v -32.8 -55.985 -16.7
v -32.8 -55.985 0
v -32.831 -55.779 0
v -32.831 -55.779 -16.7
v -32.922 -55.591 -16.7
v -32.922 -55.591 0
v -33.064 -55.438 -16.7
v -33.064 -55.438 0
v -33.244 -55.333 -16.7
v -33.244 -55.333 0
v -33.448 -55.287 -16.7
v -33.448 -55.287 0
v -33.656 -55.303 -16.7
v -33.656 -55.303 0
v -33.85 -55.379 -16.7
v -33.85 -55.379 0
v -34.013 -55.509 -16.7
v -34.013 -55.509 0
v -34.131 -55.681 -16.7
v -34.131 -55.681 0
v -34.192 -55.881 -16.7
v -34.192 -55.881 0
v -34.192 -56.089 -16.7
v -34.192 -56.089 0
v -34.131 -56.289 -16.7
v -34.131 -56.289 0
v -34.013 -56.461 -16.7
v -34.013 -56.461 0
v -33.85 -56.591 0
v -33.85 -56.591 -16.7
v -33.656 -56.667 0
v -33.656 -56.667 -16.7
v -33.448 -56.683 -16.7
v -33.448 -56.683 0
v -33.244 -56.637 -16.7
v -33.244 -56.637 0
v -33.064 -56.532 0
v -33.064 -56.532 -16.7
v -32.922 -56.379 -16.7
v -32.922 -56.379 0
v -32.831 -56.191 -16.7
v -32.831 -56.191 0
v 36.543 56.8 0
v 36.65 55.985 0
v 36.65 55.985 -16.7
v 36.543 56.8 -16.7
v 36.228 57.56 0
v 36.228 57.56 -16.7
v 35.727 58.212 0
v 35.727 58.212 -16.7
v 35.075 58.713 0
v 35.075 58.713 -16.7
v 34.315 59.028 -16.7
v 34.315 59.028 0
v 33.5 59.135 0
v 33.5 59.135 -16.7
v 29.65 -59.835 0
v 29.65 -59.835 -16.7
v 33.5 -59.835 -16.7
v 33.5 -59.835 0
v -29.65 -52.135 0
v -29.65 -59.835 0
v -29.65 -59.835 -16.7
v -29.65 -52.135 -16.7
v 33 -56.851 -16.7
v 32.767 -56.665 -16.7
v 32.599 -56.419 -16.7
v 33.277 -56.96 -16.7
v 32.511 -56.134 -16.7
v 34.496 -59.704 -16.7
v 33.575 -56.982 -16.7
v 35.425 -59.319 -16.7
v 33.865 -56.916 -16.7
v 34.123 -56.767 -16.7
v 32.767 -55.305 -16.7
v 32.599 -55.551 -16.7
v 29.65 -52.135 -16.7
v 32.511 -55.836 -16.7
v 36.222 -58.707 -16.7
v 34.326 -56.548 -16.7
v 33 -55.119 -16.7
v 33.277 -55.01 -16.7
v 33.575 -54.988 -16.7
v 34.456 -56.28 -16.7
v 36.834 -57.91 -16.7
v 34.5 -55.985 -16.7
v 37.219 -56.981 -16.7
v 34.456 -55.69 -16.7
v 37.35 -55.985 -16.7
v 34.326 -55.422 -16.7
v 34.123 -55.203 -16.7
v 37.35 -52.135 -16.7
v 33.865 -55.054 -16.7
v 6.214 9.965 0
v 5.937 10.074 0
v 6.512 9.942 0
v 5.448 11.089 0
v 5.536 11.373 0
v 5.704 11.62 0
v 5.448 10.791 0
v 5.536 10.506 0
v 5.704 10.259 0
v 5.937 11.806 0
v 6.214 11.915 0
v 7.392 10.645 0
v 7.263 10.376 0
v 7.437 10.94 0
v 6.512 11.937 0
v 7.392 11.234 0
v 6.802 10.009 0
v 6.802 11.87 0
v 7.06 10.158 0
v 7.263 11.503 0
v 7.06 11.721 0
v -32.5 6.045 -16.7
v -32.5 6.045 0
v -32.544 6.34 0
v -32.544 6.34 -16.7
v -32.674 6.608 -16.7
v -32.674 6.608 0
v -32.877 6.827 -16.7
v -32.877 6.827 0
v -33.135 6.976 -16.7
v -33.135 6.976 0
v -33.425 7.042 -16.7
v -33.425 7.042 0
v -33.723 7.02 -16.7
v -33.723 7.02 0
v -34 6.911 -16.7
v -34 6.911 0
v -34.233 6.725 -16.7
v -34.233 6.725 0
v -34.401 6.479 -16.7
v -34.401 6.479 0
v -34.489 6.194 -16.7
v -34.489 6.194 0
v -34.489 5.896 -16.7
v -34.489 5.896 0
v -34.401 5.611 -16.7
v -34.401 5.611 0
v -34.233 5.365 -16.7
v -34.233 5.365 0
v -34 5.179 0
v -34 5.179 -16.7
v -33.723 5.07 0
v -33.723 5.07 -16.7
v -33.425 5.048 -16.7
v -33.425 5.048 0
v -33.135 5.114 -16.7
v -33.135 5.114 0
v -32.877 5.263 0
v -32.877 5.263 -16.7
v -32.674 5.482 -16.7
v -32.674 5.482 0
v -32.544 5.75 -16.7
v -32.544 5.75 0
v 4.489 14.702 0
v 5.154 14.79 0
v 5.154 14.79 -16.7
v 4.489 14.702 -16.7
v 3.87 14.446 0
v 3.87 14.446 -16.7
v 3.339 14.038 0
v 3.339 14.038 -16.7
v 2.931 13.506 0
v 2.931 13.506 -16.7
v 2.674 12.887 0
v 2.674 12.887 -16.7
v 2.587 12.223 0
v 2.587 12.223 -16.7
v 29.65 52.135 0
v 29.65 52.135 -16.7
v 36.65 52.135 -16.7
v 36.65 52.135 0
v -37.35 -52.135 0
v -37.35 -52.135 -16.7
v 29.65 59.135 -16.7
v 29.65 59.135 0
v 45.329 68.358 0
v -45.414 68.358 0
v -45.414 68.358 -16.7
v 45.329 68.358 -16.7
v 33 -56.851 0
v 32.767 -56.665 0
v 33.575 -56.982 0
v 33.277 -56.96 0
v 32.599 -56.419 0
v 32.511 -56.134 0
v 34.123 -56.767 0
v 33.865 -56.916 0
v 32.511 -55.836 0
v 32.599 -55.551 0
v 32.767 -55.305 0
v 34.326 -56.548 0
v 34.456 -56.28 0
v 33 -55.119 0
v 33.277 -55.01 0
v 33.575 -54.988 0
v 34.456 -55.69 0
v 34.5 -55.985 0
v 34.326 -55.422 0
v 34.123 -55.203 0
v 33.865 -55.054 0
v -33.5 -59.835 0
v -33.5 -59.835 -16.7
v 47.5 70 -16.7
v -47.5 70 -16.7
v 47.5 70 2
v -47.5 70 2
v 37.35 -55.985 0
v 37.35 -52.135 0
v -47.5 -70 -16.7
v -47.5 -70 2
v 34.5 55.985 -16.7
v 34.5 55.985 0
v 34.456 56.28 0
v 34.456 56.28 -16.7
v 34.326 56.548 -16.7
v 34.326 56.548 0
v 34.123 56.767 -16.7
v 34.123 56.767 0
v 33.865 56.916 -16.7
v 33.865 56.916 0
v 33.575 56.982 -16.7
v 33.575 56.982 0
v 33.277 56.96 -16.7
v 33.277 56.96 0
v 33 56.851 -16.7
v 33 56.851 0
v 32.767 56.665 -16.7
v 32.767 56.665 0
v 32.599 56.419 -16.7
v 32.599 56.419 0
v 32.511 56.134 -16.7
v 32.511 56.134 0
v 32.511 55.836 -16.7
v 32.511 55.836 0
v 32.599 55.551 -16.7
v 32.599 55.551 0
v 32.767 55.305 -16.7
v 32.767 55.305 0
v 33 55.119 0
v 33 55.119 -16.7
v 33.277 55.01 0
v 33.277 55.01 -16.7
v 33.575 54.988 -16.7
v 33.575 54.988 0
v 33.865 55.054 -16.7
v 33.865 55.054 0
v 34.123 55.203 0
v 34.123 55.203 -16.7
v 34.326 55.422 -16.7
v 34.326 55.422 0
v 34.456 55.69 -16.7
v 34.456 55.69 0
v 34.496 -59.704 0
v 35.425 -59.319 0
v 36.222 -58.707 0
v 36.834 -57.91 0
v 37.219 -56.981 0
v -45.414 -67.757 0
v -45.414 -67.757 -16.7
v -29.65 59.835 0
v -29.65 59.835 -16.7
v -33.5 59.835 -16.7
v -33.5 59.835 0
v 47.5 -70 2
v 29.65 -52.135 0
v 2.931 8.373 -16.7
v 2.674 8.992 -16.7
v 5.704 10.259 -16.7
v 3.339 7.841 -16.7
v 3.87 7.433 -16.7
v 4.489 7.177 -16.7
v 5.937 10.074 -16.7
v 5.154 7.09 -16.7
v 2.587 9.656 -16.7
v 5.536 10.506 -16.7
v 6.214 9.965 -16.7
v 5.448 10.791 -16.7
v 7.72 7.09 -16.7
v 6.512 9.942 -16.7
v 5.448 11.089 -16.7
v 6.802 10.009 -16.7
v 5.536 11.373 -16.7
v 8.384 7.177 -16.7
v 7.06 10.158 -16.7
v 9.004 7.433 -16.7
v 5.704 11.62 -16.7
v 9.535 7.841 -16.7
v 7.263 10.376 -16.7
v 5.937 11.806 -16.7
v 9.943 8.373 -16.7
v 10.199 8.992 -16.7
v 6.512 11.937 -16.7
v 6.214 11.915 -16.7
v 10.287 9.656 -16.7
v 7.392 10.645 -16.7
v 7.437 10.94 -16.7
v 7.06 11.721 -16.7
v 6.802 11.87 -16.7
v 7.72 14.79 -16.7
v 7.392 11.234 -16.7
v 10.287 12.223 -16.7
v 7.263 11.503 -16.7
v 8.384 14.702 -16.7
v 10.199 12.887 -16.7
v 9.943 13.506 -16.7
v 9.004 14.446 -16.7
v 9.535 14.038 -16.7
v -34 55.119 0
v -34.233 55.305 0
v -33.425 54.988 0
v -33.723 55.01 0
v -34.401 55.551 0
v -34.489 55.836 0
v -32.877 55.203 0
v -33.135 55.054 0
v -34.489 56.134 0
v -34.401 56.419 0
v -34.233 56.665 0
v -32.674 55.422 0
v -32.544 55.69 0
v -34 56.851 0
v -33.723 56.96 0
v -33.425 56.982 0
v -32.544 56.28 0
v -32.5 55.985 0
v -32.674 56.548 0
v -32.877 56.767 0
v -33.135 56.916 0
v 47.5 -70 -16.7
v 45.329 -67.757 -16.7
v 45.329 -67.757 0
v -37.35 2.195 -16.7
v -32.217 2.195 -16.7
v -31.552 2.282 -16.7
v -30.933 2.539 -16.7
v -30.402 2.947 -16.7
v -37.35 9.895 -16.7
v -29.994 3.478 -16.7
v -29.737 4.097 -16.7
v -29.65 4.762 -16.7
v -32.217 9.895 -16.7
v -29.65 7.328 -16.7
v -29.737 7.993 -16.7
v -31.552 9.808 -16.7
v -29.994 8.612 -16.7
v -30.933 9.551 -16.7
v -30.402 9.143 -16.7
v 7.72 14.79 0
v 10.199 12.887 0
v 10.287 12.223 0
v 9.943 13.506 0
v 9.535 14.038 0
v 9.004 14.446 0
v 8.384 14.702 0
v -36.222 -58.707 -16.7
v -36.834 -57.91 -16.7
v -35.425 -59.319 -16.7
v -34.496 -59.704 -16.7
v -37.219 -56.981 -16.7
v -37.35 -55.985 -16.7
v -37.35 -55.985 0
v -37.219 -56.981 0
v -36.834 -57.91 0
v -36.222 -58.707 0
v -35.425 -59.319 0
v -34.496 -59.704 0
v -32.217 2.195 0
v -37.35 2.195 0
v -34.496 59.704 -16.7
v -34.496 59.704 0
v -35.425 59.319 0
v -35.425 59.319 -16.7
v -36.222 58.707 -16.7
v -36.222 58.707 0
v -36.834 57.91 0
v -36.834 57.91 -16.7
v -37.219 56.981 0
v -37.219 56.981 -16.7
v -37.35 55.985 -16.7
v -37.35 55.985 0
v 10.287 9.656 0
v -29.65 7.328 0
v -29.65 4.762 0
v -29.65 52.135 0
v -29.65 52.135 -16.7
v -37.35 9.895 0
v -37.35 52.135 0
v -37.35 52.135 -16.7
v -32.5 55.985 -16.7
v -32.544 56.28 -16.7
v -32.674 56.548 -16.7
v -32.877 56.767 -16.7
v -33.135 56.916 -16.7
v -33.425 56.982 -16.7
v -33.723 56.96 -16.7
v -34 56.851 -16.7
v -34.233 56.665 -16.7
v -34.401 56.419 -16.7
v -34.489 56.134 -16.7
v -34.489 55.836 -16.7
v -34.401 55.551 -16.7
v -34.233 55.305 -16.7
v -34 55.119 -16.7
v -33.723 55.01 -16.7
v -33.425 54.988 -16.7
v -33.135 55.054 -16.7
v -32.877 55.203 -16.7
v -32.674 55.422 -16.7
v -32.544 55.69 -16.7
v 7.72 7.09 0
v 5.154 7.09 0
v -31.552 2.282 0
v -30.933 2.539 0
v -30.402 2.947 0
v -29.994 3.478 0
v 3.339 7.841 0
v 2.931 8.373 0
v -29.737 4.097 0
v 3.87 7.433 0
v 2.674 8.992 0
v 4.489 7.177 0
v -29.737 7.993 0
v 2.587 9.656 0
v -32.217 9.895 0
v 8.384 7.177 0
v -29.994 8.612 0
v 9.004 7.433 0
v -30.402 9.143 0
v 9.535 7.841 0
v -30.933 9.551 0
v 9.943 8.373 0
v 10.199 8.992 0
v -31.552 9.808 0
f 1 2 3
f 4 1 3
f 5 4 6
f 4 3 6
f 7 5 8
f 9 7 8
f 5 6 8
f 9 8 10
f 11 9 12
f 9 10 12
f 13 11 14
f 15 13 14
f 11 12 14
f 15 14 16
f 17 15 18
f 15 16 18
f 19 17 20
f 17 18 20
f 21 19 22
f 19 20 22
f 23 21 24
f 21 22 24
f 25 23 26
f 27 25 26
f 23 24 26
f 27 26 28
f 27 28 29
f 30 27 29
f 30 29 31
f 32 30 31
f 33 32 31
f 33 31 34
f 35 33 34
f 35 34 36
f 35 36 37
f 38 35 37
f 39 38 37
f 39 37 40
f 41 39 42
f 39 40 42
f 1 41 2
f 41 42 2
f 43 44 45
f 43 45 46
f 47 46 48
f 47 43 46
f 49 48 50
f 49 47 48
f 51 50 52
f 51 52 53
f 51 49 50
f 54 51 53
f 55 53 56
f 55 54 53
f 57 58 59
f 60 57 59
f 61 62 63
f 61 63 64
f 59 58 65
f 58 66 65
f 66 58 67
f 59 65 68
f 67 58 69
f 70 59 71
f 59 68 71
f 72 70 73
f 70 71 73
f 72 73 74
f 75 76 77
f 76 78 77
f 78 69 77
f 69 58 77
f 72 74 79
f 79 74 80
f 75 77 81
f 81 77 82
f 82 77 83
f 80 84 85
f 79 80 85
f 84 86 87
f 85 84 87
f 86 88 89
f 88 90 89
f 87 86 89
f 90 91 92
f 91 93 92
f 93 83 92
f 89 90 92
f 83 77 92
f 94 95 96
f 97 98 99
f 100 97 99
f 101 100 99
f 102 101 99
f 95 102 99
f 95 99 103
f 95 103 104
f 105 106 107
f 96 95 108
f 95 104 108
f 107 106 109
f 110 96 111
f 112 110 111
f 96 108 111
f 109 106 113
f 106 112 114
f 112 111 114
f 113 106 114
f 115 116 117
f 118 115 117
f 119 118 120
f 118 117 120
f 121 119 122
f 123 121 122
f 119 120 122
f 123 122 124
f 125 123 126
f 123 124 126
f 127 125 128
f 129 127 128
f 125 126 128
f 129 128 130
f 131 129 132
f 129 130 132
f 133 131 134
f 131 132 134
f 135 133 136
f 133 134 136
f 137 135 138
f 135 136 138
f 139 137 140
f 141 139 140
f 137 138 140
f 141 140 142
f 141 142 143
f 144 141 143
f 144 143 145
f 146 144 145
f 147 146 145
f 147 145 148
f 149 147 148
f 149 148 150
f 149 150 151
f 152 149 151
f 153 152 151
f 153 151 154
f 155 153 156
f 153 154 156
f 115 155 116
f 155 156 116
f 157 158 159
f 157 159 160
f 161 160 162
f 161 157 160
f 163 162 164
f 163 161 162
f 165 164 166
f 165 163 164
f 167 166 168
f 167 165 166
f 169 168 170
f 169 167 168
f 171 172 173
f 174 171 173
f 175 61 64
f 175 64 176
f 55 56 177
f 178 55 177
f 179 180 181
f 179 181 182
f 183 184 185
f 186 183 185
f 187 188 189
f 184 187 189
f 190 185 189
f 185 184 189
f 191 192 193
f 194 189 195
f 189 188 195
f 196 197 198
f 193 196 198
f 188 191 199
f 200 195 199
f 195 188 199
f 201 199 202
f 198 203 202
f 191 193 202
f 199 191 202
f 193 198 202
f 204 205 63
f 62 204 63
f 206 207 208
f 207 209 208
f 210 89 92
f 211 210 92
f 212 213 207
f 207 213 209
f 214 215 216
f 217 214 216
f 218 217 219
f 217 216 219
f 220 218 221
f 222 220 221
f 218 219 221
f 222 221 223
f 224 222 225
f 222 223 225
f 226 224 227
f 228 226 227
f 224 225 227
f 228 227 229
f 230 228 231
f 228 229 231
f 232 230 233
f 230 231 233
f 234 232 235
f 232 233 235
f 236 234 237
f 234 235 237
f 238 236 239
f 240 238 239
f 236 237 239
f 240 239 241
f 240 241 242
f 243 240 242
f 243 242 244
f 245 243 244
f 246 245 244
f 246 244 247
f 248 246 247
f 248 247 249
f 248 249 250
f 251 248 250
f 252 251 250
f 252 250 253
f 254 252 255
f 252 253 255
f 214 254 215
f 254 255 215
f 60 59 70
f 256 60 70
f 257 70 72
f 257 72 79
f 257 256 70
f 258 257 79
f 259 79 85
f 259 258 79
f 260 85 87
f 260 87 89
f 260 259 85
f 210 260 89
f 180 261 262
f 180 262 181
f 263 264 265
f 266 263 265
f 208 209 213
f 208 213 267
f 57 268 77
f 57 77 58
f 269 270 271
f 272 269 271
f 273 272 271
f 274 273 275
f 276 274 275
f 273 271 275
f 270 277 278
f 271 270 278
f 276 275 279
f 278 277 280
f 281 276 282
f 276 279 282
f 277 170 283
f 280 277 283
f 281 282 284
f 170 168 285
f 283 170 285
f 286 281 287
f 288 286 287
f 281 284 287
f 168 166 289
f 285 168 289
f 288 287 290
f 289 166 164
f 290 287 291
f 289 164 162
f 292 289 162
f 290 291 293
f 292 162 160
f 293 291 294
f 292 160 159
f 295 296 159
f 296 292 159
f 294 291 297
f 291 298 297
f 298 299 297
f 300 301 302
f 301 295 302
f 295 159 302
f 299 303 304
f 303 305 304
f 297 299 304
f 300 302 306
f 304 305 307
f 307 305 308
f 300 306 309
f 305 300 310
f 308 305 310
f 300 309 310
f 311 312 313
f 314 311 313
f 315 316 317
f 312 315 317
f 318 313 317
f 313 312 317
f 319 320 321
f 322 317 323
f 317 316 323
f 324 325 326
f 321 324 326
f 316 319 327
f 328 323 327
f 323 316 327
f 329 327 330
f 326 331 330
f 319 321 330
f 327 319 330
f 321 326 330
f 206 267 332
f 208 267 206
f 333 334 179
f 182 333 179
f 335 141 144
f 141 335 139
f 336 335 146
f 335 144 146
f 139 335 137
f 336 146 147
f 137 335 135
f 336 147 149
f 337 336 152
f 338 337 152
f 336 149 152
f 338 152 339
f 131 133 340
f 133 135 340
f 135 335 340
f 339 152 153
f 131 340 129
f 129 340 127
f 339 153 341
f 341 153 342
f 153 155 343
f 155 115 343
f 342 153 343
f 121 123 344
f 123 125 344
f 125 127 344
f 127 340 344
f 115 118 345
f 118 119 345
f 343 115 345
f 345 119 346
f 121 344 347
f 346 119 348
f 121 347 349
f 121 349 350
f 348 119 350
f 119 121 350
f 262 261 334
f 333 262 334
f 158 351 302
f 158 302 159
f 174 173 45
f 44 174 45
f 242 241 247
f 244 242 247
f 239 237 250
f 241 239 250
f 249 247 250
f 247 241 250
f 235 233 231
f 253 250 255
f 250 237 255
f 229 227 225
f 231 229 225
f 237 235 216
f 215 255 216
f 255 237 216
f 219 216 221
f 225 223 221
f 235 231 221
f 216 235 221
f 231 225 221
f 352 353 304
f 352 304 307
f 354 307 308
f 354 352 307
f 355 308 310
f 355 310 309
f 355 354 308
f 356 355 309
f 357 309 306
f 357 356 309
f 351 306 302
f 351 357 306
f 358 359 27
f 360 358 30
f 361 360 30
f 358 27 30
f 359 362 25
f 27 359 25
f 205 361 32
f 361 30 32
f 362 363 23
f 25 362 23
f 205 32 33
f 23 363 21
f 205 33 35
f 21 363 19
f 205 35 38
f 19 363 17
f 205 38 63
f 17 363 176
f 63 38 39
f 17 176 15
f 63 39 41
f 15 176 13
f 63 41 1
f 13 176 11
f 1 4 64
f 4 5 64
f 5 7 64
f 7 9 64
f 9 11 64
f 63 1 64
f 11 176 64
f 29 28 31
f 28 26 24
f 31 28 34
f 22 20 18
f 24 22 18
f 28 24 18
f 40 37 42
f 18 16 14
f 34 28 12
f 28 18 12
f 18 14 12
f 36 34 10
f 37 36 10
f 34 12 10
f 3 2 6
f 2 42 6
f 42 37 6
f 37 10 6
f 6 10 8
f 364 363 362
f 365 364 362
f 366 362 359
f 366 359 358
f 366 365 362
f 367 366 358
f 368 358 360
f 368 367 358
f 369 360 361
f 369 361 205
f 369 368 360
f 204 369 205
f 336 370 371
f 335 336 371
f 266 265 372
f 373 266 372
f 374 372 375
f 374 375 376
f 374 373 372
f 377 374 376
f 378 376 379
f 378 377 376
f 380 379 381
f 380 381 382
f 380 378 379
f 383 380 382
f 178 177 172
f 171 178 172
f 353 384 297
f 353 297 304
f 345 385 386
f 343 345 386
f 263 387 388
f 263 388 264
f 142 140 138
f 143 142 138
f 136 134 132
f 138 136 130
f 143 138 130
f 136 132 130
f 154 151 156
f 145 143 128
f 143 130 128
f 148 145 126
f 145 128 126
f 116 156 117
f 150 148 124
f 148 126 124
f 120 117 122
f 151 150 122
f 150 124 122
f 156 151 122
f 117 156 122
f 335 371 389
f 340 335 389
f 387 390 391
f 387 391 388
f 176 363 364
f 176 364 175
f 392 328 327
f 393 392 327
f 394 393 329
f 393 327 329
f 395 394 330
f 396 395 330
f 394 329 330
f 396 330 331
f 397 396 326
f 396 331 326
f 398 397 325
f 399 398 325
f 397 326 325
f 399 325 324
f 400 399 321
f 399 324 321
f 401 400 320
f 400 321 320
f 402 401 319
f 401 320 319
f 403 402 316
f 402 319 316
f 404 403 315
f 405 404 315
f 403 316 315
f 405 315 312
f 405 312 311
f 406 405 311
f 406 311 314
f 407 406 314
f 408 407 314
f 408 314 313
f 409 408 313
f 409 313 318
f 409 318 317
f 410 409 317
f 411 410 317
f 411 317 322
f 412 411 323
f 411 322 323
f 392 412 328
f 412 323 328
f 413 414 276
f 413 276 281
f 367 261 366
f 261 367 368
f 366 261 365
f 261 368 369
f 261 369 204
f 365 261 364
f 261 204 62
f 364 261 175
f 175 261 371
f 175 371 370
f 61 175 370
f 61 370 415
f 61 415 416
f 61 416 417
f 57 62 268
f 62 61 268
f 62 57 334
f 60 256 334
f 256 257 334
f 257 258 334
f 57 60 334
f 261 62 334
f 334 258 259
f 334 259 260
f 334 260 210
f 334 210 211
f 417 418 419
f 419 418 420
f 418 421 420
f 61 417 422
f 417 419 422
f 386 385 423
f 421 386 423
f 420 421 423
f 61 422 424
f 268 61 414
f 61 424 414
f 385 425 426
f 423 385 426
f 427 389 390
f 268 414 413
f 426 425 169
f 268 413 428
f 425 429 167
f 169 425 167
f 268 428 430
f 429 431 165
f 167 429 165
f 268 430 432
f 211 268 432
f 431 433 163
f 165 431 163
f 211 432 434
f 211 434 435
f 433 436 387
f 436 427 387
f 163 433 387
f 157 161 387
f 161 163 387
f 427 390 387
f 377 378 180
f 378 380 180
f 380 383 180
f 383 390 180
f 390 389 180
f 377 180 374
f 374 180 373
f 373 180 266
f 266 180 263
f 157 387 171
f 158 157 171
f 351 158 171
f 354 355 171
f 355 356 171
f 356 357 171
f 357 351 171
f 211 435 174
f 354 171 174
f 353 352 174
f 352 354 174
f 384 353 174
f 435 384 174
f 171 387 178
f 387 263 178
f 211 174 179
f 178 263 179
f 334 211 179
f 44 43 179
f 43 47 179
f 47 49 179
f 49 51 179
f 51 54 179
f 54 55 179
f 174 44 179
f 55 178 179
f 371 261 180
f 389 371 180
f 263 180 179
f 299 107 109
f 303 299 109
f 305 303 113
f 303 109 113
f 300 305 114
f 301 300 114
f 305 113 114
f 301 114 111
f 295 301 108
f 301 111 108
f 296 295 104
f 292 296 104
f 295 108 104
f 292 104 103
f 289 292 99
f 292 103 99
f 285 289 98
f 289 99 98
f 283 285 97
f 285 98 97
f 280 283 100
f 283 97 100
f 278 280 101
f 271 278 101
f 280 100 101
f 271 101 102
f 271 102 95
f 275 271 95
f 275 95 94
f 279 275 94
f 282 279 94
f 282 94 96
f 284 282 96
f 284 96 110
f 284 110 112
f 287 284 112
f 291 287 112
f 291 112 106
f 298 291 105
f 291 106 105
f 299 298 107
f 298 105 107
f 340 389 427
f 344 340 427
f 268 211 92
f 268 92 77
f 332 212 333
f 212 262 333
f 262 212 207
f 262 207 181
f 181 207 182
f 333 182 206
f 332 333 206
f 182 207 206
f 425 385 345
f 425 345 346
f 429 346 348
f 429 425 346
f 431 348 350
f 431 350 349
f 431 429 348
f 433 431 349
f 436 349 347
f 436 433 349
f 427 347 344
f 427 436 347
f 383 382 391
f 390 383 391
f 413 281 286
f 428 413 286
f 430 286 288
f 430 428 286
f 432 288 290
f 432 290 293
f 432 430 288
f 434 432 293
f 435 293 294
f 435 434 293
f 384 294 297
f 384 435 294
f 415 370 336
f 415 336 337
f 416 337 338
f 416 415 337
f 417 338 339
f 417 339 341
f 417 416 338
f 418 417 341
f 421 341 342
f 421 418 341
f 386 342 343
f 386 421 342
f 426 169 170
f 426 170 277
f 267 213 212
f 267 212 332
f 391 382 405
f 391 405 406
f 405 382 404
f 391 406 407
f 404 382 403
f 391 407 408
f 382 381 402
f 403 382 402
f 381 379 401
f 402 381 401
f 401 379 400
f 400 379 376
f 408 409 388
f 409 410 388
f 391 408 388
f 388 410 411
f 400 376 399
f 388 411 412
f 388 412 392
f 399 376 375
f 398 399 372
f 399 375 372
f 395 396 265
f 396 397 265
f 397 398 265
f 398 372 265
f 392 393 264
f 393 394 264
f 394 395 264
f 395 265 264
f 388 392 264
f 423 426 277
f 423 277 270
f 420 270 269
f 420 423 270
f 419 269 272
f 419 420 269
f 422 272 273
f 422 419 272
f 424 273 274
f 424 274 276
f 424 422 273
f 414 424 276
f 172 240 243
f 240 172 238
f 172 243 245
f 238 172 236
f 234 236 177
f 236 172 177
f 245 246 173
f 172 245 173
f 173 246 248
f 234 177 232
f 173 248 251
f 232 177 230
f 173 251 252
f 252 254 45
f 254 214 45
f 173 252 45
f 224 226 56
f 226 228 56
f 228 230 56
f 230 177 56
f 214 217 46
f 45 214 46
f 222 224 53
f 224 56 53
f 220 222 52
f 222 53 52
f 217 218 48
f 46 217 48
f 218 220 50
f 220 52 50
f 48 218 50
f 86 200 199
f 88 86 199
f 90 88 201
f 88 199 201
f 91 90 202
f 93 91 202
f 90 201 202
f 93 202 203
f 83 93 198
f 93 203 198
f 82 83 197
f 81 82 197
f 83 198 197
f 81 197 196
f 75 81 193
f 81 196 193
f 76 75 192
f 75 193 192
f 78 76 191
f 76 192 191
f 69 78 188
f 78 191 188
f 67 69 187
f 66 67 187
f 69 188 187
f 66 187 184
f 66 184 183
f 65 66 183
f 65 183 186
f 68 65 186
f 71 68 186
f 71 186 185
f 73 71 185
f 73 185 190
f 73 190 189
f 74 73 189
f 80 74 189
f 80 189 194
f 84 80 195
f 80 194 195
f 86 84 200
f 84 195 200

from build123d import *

# Parameters (mm, degrees)
SKETCH002_W   = 95
SKETCH002_H   = 140
PAD_DEPTH     = 2
SKETCH001_W   = 95
SKETCH001_H   = 140
SKETCH001_W_2 = 90.742981
SKETCH001_H_2 = 136.114502
SKETCH001_R   = 1
SKETCH001_R_2 = 0.7
PAD001_DEPTH  = 16.7


with BuildPart() as part:
    # Sketch002 → Pad (new body)
    with BuildSketch(Plane.XY):
        Rectangle(SKETCH002_W, SKETCH002_H)
    extrude(amount=PAD_DEPTH)

    # Sketch001 → Pad001 (join)
    with BuildSketch(Plane.XY):
        Rectangle(SKETCH001_W, SKETCH001_H)
        with Locations((-0.042641, 0.300621)):
            Rectangle(SKETCH001_W_2, SKETCH001_H_2, mode=Mode.SUBTRACT)
        with BuildLine():
            ThreePointArc((-33.5, 59.835), (-36.222361, 58.707361), (-37.35, 55.985))
            Line((-37.35, 55.985), (-37.35, 52.135))
            Line((-37.35, 52.135), (-29.65, 52.135))
            Line((-29.65, 52.135), (-29.65, 59.835))
            Line((-29.65, 59.835), (-33.5, 59.835))
        make_face()
        with Locations((-33.5, 55.985)):
            Circle(SKETCH001_R, mode=Mode.SUBTRACT)
        with BuildLine():
            ThreePointArc((36.65, 55.985), (35.727386, 58.212386), (33.5, 59.135))
            Line((33.5, 59.135), (29.65, 59.135))
            Line((29.65, 59.135), (29.65, 52.135))
            Line((29.65, 52.135), (36.65, 52.135))
            Line((36.65, 52.135), (36.65, 55.985))
        make_face()
        with Locations((33.5, 55.985)):
            Circle(SKETCH001_R, mode=Mode.SUBTRACT)
        with BuildLine():
            Line((37.35, -52.135), (29.65, -52.135))
            Line((29.65, -52.135), (29.65, -59.835))
            Line((29.65, -59.835), (33.5, -59.835))
            ThreePointArc((33.5, -59.835), (36.222361, -58.707361), (37.35, -55.985))
            Line((37.35, -55.985), (37.35, -52.135))
        make_face()
        with Locations((33.5, -55.985)):
            Circle(SKETCH001_R, mode=Mode.SUBTRACT)
        with BuildLine():
            Line((-33.5, -59.835), (-29.65, -59.835))
            Line((-29.65, -59.835), (-29.65, -52.135))
            Line((-29.65, -52.135), (-37.35, -52.135))
            Line((-37.35, -55.985), (-37.35, -52.135))
            ThreePointArc((-37.35, -55.985), (-36.222361, -58.707361), (-33.5, -59.835))
        make_face()
        with Locations((-33.5, -55.985)):
            Circle(SKETCH001_R_2, mode=Mode.SUBTRACT)
        with BuildLine():
            ThreePointArc((-29.65, 7.328333), (-30.401759, 9.143241), (-32.216667, 9.895))
            Line((-37.35, 9.895), (-32.216667, 9.895))
            Line((-37.35, 2.195), (-37.35, 9.895))
            Line((-32.216667, 2.195), (-37.35, 2.195))
            ThreePointArc((-32.216667, 2.195), (-30.401759, 2.946759), (-29.65, 4.761667))
            Line((-29.65, 7.328333), (-29.65, 4.761667))
        make_face()
        with Locations((-33.5, 6.045)):
            Circle(SKETCH001_R, mode=Mode.SUBTRACT)
        with BuildLine():
            Line((2.586847, 12.222931), (2.586847, 9.656265))
            ThreePointArc((2.586847, 9.656265), (3.338606, 7.841357), (5.153514, 7.089598))
            Line((5.153514, 7.089598), (7.72018, 7.089598))
            ThreePointArc((7.72018, 7.089598), (9.535088, 7.841357), (10.286847, 9.656265))
            Line((10.286847, 9.656265), (10.286847, 12.222931))
            ThreePointArc((10.286847, 12.222931), (9.535088, 14.037839), (7.72018, 14.789598))
            Line((7.72018, 14.789598), (5.153514, 14.789598))
            ThreePointArc((5.153514, 14.789598), (3.338606, 14.037839), (2.586847, 12.222931))
        make_face()
        with Locations((6.436847, 10.939598)):
            Circle(SKETCH001_R, mode=Mode.SUBTRACT)
    extrude(amount=-PAD001_DEPTH)


solid = part.part
